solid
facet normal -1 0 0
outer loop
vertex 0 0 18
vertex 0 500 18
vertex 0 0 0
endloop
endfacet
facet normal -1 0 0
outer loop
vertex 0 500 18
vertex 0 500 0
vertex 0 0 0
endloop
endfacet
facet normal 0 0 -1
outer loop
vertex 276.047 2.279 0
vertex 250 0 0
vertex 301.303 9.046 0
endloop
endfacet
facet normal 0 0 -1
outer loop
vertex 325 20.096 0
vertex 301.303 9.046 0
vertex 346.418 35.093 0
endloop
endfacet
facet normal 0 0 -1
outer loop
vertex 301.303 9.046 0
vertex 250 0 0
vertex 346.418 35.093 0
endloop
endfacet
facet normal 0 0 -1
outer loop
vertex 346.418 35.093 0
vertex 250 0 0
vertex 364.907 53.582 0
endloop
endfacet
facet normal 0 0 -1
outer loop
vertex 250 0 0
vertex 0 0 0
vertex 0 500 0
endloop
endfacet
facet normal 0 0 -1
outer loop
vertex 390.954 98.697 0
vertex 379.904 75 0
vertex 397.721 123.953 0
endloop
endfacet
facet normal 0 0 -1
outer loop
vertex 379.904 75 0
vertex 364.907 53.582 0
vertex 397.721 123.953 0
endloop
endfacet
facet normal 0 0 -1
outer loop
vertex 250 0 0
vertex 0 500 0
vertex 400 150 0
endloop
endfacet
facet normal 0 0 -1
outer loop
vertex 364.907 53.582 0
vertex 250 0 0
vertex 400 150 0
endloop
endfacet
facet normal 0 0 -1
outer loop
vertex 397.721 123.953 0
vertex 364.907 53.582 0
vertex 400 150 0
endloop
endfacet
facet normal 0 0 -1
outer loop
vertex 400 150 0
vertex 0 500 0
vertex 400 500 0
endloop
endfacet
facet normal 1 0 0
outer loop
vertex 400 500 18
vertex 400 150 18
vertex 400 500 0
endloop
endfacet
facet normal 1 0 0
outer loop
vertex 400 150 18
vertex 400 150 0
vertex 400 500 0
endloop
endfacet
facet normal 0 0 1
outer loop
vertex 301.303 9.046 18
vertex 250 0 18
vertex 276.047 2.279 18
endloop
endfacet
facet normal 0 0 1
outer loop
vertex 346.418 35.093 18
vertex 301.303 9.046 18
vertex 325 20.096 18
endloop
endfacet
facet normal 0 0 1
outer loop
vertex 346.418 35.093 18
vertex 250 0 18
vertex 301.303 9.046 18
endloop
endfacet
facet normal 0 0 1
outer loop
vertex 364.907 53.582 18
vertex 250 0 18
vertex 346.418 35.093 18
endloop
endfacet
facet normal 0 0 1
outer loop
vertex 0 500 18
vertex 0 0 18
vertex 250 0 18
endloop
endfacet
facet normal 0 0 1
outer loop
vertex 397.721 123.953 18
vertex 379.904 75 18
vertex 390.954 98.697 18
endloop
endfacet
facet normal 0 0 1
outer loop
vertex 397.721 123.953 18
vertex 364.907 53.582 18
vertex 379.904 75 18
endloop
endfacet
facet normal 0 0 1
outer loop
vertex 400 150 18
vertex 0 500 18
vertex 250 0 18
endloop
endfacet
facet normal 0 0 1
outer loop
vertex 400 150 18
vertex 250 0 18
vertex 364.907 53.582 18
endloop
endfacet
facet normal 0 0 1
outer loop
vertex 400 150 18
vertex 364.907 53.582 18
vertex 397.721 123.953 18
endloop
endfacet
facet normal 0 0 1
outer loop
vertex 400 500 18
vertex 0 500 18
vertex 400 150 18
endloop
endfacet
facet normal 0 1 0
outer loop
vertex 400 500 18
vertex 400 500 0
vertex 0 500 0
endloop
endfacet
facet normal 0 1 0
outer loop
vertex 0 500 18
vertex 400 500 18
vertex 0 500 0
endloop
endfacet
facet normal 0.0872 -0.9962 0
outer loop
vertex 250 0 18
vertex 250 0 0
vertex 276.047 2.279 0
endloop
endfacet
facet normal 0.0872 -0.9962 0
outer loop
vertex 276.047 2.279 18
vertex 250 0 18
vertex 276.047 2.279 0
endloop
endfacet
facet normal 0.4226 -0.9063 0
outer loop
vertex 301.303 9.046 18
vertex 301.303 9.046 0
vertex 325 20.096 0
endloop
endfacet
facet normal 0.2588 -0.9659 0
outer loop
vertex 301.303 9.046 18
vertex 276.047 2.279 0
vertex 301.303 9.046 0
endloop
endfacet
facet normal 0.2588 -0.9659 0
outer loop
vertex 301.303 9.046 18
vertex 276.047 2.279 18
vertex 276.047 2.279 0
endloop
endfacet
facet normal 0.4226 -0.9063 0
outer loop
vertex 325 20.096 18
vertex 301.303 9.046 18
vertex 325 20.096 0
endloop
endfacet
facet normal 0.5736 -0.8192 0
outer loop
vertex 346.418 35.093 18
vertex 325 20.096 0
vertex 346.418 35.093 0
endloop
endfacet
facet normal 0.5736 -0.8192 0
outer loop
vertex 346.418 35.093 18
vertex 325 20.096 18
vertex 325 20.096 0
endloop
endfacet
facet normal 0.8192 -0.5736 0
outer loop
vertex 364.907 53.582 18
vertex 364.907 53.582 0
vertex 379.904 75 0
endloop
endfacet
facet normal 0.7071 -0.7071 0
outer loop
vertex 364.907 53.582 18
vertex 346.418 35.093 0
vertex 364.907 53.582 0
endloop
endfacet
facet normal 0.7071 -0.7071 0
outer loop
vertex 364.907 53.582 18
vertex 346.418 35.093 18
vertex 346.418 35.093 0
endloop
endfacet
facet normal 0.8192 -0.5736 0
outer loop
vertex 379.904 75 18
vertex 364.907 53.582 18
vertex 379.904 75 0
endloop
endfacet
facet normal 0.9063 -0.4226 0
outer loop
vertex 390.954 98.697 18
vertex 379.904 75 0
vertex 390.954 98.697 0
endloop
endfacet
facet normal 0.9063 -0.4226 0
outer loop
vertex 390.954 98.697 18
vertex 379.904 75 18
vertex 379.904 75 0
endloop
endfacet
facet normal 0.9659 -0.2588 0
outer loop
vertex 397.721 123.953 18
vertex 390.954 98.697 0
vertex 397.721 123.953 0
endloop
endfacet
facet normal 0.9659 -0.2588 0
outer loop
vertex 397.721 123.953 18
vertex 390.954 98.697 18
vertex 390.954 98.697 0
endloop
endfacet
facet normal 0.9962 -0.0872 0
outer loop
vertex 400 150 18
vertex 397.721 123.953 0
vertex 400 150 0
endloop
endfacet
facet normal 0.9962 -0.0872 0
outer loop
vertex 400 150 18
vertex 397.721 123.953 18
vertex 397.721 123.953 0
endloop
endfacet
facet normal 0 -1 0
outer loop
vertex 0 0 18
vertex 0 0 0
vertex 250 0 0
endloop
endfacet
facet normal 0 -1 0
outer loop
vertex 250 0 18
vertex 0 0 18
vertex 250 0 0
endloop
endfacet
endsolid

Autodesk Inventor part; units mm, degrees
ref_plane "YZ Plane" through (0, 0, 0) normal (1, 0, 0) x (0, 1, 0)
ref_plane "XZ Plane" through (0, 0, 0) normal (0, 1, 0) x (-1, 0, 0)
ref_plane "XY Plane" through (0, 0, 0) normal (0, 0, 1) x (1, 0, 0)
sketch "Sketch1" plane through (0, 0, 0) normal (0, 0, 1) x (1, 0, 0)
  line L0 (0, 0) -> (400, 0)
  line L1 (400, 0) -> (400, 500)
  line L2 (400, 500) -> (0, 500)
  line L3 (0, 500) -> (0, 0)
  dimension "d0" = 400
  dimension "d1" = 500
extrude "Extrusion1" add sketch "Sketch1" along normal blind 18
fillet "Fillet1" radius 150 1 edges at (400, 0, 9)
properties part number "Example" material "LMDF"
